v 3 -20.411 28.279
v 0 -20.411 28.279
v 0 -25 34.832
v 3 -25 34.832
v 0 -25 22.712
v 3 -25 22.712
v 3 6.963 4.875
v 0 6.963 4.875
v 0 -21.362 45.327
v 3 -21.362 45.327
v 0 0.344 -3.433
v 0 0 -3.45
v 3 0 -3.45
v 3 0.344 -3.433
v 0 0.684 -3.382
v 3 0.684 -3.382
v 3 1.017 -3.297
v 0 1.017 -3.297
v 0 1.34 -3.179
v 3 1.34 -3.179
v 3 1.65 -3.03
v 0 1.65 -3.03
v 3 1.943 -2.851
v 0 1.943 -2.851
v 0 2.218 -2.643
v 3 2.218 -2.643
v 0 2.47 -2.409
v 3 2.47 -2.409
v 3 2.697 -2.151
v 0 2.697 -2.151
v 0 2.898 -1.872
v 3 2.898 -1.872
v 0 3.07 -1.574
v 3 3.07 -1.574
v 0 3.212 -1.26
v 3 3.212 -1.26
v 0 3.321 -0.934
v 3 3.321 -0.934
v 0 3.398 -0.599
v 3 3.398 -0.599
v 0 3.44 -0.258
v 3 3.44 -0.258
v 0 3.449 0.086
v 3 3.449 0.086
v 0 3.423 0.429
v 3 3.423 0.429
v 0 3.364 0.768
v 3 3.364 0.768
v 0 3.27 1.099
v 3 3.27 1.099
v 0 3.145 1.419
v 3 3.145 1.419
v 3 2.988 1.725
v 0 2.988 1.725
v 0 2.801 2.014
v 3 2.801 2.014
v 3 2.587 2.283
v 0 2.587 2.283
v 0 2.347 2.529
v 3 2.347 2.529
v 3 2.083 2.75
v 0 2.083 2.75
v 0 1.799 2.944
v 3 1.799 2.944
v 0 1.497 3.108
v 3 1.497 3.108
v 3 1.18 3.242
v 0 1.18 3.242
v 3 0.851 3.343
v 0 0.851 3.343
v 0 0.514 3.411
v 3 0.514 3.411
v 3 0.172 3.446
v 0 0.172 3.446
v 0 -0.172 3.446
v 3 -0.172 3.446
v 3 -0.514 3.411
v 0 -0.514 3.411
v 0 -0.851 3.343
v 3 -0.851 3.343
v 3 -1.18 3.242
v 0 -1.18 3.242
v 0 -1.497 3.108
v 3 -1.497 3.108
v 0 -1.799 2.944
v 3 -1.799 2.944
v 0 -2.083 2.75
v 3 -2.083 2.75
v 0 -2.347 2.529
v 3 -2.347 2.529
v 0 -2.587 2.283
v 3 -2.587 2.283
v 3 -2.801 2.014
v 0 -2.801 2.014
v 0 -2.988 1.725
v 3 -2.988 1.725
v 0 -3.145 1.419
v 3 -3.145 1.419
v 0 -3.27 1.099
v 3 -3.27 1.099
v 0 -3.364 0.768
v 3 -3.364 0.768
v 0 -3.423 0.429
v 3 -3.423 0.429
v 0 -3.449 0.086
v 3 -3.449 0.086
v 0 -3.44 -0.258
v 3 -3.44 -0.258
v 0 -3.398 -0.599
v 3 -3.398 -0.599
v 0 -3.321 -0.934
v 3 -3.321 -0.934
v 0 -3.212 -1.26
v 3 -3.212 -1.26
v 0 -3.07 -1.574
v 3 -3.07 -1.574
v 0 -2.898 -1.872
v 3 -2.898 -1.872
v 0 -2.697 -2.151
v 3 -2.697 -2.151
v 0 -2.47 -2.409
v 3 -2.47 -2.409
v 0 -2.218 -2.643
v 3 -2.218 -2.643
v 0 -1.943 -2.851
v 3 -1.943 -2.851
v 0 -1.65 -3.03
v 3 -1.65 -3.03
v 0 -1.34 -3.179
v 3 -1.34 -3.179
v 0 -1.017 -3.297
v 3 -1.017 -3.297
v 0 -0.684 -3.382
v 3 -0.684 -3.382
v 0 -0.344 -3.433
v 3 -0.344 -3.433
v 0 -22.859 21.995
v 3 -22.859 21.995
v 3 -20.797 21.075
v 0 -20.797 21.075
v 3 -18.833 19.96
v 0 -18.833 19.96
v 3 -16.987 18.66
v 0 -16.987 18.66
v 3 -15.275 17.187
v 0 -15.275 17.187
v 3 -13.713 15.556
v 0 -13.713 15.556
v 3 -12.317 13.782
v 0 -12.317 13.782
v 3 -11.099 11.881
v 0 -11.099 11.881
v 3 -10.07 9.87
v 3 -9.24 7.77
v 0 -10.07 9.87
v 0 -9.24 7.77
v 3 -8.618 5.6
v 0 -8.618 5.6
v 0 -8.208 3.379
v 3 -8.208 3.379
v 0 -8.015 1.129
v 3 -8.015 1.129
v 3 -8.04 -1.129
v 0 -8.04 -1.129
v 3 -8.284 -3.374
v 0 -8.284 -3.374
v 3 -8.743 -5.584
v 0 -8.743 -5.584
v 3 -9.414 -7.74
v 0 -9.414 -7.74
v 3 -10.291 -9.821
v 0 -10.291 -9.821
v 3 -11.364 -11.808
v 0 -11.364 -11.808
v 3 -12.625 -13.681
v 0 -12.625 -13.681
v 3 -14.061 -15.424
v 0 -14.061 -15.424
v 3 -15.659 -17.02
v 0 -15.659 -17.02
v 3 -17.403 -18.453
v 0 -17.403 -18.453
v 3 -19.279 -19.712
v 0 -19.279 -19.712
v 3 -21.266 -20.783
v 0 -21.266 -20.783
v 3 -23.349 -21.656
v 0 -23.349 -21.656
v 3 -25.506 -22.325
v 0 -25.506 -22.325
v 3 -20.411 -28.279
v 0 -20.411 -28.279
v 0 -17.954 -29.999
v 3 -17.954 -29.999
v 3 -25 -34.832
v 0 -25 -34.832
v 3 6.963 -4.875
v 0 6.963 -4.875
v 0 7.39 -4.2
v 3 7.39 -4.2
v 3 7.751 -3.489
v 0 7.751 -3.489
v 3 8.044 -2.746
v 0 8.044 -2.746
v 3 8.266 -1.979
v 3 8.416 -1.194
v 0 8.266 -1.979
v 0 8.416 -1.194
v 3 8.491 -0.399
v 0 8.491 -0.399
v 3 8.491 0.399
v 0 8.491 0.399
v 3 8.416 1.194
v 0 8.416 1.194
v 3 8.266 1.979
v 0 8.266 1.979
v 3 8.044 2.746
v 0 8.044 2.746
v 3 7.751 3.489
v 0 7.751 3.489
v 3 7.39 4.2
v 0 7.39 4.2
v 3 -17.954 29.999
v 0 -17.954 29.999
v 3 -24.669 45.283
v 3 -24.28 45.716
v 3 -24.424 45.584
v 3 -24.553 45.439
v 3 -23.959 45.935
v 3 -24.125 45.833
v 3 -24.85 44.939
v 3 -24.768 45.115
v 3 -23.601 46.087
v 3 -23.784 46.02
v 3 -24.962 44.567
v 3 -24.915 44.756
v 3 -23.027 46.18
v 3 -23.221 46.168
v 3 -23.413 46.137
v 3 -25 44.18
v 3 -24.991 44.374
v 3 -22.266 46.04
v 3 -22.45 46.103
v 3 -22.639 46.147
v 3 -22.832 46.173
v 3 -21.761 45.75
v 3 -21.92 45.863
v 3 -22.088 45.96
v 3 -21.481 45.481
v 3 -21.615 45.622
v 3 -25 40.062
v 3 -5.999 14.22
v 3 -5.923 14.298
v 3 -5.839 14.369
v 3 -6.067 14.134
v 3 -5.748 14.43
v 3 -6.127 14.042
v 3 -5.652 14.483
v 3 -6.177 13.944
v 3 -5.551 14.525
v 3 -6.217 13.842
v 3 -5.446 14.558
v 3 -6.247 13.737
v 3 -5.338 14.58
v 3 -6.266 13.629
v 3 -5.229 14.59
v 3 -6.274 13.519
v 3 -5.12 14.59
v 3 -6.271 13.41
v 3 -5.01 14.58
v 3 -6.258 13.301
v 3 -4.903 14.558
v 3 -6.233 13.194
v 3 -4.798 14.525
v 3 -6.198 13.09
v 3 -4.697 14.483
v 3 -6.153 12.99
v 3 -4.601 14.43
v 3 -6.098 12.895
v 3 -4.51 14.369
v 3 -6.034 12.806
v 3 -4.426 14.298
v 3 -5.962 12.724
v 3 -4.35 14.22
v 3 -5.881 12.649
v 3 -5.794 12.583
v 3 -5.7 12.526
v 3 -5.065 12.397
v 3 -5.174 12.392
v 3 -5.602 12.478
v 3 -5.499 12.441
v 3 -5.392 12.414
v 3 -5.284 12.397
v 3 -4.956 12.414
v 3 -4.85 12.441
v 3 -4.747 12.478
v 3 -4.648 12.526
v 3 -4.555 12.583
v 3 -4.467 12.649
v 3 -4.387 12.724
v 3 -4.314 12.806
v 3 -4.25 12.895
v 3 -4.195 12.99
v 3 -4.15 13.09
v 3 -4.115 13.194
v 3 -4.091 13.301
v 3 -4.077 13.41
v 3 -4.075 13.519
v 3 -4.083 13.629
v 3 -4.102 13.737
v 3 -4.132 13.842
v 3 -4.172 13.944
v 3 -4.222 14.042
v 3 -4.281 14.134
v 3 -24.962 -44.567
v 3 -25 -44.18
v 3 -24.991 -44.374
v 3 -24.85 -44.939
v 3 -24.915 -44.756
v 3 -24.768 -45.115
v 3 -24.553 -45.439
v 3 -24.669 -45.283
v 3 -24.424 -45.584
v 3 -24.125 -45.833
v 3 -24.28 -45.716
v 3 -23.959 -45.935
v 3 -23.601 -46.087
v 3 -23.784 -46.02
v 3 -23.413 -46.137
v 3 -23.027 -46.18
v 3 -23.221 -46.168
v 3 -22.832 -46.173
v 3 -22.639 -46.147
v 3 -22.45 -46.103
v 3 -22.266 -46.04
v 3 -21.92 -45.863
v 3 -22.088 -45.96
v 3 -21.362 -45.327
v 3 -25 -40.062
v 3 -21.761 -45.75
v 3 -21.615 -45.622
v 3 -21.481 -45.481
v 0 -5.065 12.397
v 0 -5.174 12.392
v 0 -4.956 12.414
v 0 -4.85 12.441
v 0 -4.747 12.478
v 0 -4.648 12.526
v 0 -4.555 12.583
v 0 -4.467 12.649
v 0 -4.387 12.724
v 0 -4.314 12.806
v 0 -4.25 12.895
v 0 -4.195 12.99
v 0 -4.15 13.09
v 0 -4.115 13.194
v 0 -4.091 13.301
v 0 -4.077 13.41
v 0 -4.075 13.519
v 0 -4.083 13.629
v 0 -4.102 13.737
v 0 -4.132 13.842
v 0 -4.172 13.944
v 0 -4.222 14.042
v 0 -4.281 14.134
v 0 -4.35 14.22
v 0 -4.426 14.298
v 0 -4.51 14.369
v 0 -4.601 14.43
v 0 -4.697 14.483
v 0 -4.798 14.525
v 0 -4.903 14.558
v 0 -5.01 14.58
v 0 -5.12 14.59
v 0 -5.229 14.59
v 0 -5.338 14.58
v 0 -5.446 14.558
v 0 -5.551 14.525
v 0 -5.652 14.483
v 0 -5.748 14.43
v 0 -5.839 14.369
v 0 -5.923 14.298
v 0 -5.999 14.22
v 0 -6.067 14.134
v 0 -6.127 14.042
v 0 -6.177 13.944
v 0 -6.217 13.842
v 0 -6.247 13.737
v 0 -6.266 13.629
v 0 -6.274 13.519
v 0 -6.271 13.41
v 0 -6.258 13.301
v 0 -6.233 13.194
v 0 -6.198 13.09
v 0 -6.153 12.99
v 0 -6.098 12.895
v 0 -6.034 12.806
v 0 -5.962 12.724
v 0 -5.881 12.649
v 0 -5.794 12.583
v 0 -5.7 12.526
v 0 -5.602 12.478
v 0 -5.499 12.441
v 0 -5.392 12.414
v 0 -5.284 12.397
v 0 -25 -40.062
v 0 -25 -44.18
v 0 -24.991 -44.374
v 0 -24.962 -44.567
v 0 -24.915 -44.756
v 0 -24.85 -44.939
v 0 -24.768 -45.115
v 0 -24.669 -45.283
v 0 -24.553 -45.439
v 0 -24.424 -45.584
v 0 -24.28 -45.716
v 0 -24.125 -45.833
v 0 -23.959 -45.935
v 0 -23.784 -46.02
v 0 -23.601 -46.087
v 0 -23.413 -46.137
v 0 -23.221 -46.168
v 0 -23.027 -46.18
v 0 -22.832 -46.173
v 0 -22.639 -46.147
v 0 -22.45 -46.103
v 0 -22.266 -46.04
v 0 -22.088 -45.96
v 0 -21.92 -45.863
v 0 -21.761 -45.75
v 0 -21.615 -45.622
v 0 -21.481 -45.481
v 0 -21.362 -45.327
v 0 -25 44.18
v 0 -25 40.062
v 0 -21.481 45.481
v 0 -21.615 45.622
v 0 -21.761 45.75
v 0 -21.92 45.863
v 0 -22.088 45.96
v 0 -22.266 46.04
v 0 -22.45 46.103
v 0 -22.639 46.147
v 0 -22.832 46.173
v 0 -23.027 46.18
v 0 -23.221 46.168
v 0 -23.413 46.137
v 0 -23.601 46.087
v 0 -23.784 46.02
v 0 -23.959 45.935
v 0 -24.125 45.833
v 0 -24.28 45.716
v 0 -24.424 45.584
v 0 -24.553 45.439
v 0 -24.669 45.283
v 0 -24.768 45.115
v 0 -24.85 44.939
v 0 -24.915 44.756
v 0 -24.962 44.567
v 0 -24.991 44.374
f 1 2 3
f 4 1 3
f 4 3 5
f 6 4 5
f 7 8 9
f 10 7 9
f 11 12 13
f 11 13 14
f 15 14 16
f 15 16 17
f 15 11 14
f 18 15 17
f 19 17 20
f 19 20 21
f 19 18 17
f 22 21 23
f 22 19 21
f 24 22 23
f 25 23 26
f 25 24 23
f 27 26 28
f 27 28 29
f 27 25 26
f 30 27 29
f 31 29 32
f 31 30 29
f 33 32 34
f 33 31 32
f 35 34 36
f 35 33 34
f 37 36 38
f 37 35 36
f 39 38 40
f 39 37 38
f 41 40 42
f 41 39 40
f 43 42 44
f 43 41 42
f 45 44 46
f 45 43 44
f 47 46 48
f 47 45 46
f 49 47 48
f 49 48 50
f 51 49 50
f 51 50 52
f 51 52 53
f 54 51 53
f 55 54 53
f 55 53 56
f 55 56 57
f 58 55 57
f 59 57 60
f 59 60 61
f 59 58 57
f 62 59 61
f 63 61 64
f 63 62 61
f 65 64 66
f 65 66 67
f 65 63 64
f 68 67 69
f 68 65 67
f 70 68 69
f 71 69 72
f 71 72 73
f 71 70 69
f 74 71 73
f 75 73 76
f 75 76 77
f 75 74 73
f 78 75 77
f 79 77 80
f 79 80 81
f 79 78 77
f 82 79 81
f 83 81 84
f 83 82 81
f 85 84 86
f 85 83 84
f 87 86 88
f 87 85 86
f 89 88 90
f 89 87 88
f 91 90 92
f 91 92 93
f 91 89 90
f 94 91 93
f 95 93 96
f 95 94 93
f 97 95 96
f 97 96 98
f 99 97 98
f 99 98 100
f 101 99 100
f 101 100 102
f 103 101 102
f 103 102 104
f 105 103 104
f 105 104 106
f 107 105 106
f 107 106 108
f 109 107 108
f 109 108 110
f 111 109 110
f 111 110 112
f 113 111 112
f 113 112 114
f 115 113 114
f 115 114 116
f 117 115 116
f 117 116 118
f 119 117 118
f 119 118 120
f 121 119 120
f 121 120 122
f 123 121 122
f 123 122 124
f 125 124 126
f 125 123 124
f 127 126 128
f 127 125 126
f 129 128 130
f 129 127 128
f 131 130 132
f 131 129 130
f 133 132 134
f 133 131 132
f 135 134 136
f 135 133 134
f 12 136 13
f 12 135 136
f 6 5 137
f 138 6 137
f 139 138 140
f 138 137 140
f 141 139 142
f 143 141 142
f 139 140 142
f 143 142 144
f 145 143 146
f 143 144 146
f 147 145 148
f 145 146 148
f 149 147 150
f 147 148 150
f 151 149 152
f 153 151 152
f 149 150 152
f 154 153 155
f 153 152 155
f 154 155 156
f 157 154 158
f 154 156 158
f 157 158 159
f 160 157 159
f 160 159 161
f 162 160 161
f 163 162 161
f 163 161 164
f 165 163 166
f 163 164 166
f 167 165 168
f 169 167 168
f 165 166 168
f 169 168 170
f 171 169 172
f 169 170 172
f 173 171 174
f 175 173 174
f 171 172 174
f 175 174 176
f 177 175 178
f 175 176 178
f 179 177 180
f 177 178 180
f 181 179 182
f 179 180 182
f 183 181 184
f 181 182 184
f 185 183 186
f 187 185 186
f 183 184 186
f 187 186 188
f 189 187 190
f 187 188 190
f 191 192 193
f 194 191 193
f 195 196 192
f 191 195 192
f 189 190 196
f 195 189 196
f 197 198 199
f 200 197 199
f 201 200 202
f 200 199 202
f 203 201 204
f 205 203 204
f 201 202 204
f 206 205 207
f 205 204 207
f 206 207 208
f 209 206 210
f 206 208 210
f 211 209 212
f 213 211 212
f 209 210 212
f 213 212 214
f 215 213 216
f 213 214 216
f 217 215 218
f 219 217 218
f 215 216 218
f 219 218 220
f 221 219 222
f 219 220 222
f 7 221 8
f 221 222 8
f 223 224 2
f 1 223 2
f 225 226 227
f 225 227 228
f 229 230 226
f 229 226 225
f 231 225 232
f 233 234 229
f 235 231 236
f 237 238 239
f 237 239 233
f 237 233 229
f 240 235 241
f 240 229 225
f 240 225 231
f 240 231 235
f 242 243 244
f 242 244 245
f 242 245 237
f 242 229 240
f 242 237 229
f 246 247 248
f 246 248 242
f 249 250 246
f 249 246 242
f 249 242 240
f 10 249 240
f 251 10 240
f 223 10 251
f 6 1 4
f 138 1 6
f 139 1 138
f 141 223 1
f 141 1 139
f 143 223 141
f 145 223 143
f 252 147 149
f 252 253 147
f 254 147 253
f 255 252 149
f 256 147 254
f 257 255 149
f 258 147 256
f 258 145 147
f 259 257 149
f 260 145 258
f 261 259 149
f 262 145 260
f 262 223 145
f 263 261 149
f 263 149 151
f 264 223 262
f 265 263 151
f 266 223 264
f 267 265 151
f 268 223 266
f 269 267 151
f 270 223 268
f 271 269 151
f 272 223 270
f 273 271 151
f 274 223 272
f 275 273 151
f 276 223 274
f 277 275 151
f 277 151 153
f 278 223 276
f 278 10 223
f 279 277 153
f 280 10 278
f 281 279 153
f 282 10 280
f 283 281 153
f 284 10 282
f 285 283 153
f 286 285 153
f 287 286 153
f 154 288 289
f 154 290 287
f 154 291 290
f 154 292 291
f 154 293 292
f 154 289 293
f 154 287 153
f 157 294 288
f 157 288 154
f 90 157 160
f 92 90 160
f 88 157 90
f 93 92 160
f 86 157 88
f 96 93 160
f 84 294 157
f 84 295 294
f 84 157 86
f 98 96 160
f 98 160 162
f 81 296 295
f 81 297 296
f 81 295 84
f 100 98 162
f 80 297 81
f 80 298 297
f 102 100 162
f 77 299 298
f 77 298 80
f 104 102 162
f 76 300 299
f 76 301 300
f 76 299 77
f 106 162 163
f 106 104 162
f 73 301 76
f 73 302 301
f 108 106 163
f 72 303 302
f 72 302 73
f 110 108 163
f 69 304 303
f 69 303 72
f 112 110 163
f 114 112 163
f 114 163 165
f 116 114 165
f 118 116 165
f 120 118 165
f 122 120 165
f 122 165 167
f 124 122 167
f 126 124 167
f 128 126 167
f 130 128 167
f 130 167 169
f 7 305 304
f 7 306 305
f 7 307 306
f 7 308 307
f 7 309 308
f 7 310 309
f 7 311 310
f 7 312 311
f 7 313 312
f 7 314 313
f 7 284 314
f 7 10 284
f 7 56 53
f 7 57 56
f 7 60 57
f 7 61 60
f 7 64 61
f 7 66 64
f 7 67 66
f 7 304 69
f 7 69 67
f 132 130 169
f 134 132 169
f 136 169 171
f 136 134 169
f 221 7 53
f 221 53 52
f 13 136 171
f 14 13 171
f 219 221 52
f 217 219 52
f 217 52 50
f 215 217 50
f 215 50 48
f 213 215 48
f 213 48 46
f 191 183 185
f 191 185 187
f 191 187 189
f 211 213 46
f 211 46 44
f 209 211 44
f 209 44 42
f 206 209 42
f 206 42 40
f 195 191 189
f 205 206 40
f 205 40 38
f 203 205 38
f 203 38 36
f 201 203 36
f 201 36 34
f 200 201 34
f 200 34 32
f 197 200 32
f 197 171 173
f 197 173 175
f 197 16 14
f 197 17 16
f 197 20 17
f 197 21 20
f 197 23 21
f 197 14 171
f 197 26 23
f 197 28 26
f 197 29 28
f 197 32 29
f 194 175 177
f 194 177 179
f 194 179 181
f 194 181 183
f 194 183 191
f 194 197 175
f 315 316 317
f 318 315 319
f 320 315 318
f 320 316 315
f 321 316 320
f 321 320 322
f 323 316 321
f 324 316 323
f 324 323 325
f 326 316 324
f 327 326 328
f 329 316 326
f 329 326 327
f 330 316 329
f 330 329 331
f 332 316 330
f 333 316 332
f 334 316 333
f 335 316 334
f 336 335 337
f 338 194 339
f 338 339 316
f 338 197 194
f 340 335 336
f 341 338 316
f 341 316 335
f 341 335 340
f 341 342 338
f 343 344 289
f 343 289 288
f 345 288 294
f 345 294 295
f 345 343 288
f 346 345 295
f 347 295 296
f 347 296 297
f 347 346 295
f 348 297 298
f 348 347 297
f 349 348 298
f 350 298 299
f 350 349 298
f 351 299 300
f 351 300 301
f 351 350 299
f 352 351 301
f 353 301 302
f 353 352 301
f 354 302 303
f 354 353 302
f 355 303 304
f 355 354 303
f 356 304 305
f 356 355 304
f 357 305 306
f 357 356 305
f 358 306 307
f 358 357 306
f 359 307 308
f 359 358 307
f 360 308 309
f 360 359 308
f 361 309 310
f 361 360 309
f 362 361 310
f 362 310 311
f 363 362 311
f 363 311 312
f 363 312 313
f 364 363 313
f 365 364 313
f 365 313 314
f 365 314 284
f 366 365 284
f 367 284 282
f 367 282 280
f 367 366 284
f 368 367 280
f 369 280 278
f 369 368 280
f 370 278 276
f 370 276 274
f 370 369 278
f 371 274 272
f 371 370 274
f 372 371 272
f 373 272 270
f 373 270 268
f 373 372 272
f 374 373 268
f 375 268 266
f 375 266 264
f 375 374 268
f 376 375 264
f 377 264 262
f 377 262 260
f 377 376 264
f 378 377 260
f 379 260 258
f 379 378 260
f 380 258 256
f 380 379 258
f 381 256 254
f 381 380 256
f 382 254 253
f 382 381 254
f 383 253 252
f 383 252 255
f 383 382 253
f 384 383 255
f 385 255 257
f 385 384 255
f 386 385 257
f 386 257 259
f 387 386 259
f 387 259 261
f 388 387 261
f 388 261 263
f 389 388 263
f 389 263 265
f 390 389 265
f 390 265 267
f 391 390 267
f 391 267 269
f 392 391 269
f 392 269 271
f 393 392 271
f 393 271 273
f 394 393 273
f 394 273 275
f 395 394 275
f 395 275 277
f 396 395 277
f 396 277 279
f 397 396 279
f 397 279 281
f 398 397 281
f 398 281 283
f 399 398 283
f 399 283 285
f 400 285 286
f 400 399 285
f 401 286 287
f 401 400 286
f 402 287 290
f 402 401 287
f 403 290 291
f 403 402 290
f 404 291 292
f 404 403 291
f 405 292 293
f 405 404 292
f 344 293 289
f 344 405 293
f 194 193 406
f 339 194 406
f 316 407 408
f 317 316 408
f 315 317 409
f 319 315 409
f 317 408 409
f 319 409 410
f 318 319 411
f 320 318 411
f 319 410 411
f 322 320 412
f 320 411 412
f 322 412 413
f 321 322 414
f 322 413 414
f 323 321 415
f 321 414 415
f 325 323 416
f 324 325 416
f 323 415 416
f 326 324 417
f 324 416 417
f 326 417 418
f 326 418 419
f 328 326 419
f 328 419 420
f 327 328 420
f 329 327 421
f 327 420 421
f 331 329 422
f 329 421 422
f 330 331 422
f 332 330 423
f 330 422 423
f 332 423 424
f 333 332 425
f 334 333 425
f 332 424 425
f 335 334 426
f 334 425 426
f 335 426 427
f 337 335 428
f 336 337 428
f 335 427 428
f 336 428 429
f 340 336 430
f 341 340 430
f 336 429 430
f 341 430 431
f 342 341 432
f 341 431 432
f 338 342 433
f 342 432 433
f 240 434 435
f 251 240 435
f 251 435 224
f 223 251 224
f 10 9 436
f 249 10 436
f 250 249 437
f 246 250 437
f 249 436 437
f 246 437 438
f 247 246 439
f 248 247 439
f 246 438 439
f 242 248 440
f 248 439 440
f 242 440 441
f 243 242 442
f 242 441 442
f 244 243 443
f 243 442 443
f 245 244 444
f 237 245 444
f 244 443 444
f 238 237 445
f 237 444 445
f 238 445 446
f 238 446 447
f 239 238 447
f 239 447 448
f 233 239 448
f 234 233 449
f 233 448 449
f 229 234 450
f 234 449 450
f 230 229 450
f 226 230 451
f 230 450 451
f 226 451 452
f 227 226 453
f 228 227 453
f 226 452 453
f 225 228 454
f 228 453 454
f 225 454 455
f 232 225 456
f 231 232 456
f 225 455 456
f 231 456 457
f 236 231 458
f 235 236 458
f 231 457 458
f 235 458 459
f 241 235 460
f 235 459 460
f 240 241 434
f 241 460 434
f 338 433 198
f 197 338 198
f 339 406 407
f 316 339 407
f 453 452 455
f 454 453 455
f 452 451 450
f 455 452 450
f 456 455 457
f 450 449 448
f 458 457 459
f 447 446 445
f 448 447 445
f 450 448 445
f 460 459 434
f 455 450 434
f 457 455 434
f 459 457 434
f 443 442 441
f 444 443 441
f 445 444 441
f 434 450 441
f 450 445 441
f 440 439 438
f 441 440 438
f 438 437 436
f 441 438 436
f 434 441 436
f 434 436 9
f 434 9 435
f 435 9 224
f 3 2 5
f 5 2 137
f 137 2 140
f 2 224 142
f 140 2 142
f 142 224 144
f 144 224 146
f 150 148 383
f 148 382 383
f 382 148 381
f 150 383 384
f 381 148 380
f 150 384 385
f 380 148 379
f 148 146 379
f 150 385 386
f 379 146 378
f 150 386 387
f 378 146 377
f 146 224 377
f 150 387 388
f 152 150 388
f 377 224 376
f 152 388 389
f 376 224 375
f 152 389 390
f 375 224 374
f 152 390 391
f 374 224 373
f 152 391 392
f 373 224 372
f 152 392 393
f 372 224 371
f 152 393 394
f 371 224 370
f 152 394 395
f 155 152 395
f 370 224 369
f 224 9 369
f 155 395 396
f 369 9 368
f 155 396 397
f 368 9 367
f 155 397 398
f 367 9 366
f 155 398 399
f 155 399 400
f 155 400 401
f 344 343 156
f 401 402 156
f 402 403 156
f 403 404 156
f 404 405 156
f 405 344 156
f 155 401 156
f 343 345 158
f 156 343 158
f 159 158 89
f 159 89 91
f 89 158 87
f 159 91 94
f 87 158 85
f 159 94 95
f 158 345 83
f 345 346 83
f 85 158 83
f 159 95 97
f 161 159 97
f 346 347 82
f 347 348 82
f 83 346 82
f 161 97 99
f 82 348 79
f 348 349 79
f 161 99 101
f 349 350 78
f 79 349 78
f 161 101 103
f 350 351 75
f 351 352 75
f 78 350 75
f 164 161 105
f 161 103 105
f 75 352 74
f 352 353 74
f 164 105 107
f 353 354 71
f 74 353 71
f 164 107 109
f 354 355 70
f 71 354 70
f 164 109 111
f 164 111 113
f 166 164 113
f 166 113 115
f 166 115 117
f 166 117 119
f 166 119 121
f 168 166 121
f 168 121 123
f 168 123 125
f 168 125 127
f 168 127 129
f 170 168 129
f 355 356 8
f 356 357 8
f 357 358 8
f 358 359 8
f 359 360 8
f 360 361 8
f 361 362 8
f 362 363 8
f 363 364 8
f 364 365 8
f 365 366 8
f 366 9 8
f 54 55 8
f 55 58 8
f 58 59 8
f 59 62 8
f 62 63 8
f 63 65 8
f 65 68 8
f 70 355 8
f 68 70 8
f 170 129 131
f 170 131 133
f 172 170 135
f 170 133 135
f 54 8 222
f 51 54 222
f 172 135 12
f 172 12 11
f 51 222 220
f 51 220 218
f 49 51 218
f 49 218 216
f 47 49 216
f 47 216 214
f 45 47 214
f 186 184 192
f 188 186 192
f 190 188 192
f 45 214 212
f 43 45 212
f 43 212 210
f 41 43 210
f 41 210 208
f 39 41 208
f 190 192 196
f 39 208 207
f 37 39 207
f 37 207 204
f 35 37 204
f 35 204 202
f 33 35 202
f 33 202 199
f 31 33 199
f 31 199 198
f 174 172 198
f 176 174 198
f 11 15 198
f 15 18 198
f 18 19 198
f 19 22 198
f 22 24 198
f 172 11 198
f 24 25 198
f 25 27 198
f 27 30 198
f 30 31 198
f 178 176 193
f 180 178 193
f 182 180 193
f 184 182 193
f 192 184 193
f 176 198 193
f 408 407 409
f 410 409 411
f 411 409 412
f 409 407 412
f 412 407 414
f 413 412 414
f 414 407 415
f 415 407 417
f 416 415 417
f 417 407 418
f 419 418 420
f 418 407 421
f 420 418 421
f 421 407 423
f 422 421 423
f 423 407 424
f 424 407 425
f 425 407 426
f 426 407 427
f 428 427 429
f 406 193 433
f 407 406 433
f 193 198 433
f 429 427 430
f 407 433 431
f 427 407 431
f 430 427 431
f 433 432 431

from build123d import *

# Parameters (mm, degrees)
SKETCH1_R           = 3.45
SKETCH1_R_2         = 1.1
BOSS_EXTRUDE1_DEPTH = 3


with BuildPart() as part:
    # Sketch1 → Boss-Extrude1 (new body)
    with BuildSketch(Plane(origin=(0, 0, 0), x_dir=(0, 0, -1), z_dir=(1, 0, 0))):
        with BuildLine():
            Line((-4.875399709, 6.962792376), (-45.326961199, -21.361695911))
            ThreePointArc((-45.326961199, -21.361695911), (-46.087242228, -23.601411599), (-44.179808327, -25))
            Line((-44.179808327, -25), (-40.062317158, -25))
            Line((-40.062317158, -25), (-29.999489725, -17.953932376))
            Line((-29.999489725, -17.953932376), (-28.278760416, -20.411388509))
            Line((-28.278760416, -20.411388509), (-34.831976771, -25))
            Line((-34.831976771, -25), (-22.712020043, -25))
            ThreePointArc((-22.712020043, -25), (0, -8), (22.324675322, -25.505562722))
            Line((22.324675322, -25.505562722), (34.831976771, -25))
            Line((34.831976771, -25), (28.278760416, -20.411388509))
            Line((28.278760416, -20.411388509), (29.999489725, -17.953932376))
            Line((29.999489725, -17.953932376), (40.062317158, -25))
            Line((40.062317158, -25), (44.179808327, -25))
            ThreePointArc((44.179808327, -25), (46.087242228, -23.601411599), (45.326961199, -21.361695911))
            Line((45.326961199, -21.361695911), (4.875399709, 6.962792376))
            ThreePointArc((4.875399709, 6.962792376), (0, 8.5), (-4.875399709, 6.962792376))
        make_face()
        Circle(SKETCH1_R, mode=Mode.SUBTRACT)
        with Locations((-13.491798398, -5.174347881)):
            Circle(SKETCH1_R_2, mode=Mode.SUBTRACT)
    extrude(amount=BOSS_EXTRUDE1_DEPTH)


solid = part.part
